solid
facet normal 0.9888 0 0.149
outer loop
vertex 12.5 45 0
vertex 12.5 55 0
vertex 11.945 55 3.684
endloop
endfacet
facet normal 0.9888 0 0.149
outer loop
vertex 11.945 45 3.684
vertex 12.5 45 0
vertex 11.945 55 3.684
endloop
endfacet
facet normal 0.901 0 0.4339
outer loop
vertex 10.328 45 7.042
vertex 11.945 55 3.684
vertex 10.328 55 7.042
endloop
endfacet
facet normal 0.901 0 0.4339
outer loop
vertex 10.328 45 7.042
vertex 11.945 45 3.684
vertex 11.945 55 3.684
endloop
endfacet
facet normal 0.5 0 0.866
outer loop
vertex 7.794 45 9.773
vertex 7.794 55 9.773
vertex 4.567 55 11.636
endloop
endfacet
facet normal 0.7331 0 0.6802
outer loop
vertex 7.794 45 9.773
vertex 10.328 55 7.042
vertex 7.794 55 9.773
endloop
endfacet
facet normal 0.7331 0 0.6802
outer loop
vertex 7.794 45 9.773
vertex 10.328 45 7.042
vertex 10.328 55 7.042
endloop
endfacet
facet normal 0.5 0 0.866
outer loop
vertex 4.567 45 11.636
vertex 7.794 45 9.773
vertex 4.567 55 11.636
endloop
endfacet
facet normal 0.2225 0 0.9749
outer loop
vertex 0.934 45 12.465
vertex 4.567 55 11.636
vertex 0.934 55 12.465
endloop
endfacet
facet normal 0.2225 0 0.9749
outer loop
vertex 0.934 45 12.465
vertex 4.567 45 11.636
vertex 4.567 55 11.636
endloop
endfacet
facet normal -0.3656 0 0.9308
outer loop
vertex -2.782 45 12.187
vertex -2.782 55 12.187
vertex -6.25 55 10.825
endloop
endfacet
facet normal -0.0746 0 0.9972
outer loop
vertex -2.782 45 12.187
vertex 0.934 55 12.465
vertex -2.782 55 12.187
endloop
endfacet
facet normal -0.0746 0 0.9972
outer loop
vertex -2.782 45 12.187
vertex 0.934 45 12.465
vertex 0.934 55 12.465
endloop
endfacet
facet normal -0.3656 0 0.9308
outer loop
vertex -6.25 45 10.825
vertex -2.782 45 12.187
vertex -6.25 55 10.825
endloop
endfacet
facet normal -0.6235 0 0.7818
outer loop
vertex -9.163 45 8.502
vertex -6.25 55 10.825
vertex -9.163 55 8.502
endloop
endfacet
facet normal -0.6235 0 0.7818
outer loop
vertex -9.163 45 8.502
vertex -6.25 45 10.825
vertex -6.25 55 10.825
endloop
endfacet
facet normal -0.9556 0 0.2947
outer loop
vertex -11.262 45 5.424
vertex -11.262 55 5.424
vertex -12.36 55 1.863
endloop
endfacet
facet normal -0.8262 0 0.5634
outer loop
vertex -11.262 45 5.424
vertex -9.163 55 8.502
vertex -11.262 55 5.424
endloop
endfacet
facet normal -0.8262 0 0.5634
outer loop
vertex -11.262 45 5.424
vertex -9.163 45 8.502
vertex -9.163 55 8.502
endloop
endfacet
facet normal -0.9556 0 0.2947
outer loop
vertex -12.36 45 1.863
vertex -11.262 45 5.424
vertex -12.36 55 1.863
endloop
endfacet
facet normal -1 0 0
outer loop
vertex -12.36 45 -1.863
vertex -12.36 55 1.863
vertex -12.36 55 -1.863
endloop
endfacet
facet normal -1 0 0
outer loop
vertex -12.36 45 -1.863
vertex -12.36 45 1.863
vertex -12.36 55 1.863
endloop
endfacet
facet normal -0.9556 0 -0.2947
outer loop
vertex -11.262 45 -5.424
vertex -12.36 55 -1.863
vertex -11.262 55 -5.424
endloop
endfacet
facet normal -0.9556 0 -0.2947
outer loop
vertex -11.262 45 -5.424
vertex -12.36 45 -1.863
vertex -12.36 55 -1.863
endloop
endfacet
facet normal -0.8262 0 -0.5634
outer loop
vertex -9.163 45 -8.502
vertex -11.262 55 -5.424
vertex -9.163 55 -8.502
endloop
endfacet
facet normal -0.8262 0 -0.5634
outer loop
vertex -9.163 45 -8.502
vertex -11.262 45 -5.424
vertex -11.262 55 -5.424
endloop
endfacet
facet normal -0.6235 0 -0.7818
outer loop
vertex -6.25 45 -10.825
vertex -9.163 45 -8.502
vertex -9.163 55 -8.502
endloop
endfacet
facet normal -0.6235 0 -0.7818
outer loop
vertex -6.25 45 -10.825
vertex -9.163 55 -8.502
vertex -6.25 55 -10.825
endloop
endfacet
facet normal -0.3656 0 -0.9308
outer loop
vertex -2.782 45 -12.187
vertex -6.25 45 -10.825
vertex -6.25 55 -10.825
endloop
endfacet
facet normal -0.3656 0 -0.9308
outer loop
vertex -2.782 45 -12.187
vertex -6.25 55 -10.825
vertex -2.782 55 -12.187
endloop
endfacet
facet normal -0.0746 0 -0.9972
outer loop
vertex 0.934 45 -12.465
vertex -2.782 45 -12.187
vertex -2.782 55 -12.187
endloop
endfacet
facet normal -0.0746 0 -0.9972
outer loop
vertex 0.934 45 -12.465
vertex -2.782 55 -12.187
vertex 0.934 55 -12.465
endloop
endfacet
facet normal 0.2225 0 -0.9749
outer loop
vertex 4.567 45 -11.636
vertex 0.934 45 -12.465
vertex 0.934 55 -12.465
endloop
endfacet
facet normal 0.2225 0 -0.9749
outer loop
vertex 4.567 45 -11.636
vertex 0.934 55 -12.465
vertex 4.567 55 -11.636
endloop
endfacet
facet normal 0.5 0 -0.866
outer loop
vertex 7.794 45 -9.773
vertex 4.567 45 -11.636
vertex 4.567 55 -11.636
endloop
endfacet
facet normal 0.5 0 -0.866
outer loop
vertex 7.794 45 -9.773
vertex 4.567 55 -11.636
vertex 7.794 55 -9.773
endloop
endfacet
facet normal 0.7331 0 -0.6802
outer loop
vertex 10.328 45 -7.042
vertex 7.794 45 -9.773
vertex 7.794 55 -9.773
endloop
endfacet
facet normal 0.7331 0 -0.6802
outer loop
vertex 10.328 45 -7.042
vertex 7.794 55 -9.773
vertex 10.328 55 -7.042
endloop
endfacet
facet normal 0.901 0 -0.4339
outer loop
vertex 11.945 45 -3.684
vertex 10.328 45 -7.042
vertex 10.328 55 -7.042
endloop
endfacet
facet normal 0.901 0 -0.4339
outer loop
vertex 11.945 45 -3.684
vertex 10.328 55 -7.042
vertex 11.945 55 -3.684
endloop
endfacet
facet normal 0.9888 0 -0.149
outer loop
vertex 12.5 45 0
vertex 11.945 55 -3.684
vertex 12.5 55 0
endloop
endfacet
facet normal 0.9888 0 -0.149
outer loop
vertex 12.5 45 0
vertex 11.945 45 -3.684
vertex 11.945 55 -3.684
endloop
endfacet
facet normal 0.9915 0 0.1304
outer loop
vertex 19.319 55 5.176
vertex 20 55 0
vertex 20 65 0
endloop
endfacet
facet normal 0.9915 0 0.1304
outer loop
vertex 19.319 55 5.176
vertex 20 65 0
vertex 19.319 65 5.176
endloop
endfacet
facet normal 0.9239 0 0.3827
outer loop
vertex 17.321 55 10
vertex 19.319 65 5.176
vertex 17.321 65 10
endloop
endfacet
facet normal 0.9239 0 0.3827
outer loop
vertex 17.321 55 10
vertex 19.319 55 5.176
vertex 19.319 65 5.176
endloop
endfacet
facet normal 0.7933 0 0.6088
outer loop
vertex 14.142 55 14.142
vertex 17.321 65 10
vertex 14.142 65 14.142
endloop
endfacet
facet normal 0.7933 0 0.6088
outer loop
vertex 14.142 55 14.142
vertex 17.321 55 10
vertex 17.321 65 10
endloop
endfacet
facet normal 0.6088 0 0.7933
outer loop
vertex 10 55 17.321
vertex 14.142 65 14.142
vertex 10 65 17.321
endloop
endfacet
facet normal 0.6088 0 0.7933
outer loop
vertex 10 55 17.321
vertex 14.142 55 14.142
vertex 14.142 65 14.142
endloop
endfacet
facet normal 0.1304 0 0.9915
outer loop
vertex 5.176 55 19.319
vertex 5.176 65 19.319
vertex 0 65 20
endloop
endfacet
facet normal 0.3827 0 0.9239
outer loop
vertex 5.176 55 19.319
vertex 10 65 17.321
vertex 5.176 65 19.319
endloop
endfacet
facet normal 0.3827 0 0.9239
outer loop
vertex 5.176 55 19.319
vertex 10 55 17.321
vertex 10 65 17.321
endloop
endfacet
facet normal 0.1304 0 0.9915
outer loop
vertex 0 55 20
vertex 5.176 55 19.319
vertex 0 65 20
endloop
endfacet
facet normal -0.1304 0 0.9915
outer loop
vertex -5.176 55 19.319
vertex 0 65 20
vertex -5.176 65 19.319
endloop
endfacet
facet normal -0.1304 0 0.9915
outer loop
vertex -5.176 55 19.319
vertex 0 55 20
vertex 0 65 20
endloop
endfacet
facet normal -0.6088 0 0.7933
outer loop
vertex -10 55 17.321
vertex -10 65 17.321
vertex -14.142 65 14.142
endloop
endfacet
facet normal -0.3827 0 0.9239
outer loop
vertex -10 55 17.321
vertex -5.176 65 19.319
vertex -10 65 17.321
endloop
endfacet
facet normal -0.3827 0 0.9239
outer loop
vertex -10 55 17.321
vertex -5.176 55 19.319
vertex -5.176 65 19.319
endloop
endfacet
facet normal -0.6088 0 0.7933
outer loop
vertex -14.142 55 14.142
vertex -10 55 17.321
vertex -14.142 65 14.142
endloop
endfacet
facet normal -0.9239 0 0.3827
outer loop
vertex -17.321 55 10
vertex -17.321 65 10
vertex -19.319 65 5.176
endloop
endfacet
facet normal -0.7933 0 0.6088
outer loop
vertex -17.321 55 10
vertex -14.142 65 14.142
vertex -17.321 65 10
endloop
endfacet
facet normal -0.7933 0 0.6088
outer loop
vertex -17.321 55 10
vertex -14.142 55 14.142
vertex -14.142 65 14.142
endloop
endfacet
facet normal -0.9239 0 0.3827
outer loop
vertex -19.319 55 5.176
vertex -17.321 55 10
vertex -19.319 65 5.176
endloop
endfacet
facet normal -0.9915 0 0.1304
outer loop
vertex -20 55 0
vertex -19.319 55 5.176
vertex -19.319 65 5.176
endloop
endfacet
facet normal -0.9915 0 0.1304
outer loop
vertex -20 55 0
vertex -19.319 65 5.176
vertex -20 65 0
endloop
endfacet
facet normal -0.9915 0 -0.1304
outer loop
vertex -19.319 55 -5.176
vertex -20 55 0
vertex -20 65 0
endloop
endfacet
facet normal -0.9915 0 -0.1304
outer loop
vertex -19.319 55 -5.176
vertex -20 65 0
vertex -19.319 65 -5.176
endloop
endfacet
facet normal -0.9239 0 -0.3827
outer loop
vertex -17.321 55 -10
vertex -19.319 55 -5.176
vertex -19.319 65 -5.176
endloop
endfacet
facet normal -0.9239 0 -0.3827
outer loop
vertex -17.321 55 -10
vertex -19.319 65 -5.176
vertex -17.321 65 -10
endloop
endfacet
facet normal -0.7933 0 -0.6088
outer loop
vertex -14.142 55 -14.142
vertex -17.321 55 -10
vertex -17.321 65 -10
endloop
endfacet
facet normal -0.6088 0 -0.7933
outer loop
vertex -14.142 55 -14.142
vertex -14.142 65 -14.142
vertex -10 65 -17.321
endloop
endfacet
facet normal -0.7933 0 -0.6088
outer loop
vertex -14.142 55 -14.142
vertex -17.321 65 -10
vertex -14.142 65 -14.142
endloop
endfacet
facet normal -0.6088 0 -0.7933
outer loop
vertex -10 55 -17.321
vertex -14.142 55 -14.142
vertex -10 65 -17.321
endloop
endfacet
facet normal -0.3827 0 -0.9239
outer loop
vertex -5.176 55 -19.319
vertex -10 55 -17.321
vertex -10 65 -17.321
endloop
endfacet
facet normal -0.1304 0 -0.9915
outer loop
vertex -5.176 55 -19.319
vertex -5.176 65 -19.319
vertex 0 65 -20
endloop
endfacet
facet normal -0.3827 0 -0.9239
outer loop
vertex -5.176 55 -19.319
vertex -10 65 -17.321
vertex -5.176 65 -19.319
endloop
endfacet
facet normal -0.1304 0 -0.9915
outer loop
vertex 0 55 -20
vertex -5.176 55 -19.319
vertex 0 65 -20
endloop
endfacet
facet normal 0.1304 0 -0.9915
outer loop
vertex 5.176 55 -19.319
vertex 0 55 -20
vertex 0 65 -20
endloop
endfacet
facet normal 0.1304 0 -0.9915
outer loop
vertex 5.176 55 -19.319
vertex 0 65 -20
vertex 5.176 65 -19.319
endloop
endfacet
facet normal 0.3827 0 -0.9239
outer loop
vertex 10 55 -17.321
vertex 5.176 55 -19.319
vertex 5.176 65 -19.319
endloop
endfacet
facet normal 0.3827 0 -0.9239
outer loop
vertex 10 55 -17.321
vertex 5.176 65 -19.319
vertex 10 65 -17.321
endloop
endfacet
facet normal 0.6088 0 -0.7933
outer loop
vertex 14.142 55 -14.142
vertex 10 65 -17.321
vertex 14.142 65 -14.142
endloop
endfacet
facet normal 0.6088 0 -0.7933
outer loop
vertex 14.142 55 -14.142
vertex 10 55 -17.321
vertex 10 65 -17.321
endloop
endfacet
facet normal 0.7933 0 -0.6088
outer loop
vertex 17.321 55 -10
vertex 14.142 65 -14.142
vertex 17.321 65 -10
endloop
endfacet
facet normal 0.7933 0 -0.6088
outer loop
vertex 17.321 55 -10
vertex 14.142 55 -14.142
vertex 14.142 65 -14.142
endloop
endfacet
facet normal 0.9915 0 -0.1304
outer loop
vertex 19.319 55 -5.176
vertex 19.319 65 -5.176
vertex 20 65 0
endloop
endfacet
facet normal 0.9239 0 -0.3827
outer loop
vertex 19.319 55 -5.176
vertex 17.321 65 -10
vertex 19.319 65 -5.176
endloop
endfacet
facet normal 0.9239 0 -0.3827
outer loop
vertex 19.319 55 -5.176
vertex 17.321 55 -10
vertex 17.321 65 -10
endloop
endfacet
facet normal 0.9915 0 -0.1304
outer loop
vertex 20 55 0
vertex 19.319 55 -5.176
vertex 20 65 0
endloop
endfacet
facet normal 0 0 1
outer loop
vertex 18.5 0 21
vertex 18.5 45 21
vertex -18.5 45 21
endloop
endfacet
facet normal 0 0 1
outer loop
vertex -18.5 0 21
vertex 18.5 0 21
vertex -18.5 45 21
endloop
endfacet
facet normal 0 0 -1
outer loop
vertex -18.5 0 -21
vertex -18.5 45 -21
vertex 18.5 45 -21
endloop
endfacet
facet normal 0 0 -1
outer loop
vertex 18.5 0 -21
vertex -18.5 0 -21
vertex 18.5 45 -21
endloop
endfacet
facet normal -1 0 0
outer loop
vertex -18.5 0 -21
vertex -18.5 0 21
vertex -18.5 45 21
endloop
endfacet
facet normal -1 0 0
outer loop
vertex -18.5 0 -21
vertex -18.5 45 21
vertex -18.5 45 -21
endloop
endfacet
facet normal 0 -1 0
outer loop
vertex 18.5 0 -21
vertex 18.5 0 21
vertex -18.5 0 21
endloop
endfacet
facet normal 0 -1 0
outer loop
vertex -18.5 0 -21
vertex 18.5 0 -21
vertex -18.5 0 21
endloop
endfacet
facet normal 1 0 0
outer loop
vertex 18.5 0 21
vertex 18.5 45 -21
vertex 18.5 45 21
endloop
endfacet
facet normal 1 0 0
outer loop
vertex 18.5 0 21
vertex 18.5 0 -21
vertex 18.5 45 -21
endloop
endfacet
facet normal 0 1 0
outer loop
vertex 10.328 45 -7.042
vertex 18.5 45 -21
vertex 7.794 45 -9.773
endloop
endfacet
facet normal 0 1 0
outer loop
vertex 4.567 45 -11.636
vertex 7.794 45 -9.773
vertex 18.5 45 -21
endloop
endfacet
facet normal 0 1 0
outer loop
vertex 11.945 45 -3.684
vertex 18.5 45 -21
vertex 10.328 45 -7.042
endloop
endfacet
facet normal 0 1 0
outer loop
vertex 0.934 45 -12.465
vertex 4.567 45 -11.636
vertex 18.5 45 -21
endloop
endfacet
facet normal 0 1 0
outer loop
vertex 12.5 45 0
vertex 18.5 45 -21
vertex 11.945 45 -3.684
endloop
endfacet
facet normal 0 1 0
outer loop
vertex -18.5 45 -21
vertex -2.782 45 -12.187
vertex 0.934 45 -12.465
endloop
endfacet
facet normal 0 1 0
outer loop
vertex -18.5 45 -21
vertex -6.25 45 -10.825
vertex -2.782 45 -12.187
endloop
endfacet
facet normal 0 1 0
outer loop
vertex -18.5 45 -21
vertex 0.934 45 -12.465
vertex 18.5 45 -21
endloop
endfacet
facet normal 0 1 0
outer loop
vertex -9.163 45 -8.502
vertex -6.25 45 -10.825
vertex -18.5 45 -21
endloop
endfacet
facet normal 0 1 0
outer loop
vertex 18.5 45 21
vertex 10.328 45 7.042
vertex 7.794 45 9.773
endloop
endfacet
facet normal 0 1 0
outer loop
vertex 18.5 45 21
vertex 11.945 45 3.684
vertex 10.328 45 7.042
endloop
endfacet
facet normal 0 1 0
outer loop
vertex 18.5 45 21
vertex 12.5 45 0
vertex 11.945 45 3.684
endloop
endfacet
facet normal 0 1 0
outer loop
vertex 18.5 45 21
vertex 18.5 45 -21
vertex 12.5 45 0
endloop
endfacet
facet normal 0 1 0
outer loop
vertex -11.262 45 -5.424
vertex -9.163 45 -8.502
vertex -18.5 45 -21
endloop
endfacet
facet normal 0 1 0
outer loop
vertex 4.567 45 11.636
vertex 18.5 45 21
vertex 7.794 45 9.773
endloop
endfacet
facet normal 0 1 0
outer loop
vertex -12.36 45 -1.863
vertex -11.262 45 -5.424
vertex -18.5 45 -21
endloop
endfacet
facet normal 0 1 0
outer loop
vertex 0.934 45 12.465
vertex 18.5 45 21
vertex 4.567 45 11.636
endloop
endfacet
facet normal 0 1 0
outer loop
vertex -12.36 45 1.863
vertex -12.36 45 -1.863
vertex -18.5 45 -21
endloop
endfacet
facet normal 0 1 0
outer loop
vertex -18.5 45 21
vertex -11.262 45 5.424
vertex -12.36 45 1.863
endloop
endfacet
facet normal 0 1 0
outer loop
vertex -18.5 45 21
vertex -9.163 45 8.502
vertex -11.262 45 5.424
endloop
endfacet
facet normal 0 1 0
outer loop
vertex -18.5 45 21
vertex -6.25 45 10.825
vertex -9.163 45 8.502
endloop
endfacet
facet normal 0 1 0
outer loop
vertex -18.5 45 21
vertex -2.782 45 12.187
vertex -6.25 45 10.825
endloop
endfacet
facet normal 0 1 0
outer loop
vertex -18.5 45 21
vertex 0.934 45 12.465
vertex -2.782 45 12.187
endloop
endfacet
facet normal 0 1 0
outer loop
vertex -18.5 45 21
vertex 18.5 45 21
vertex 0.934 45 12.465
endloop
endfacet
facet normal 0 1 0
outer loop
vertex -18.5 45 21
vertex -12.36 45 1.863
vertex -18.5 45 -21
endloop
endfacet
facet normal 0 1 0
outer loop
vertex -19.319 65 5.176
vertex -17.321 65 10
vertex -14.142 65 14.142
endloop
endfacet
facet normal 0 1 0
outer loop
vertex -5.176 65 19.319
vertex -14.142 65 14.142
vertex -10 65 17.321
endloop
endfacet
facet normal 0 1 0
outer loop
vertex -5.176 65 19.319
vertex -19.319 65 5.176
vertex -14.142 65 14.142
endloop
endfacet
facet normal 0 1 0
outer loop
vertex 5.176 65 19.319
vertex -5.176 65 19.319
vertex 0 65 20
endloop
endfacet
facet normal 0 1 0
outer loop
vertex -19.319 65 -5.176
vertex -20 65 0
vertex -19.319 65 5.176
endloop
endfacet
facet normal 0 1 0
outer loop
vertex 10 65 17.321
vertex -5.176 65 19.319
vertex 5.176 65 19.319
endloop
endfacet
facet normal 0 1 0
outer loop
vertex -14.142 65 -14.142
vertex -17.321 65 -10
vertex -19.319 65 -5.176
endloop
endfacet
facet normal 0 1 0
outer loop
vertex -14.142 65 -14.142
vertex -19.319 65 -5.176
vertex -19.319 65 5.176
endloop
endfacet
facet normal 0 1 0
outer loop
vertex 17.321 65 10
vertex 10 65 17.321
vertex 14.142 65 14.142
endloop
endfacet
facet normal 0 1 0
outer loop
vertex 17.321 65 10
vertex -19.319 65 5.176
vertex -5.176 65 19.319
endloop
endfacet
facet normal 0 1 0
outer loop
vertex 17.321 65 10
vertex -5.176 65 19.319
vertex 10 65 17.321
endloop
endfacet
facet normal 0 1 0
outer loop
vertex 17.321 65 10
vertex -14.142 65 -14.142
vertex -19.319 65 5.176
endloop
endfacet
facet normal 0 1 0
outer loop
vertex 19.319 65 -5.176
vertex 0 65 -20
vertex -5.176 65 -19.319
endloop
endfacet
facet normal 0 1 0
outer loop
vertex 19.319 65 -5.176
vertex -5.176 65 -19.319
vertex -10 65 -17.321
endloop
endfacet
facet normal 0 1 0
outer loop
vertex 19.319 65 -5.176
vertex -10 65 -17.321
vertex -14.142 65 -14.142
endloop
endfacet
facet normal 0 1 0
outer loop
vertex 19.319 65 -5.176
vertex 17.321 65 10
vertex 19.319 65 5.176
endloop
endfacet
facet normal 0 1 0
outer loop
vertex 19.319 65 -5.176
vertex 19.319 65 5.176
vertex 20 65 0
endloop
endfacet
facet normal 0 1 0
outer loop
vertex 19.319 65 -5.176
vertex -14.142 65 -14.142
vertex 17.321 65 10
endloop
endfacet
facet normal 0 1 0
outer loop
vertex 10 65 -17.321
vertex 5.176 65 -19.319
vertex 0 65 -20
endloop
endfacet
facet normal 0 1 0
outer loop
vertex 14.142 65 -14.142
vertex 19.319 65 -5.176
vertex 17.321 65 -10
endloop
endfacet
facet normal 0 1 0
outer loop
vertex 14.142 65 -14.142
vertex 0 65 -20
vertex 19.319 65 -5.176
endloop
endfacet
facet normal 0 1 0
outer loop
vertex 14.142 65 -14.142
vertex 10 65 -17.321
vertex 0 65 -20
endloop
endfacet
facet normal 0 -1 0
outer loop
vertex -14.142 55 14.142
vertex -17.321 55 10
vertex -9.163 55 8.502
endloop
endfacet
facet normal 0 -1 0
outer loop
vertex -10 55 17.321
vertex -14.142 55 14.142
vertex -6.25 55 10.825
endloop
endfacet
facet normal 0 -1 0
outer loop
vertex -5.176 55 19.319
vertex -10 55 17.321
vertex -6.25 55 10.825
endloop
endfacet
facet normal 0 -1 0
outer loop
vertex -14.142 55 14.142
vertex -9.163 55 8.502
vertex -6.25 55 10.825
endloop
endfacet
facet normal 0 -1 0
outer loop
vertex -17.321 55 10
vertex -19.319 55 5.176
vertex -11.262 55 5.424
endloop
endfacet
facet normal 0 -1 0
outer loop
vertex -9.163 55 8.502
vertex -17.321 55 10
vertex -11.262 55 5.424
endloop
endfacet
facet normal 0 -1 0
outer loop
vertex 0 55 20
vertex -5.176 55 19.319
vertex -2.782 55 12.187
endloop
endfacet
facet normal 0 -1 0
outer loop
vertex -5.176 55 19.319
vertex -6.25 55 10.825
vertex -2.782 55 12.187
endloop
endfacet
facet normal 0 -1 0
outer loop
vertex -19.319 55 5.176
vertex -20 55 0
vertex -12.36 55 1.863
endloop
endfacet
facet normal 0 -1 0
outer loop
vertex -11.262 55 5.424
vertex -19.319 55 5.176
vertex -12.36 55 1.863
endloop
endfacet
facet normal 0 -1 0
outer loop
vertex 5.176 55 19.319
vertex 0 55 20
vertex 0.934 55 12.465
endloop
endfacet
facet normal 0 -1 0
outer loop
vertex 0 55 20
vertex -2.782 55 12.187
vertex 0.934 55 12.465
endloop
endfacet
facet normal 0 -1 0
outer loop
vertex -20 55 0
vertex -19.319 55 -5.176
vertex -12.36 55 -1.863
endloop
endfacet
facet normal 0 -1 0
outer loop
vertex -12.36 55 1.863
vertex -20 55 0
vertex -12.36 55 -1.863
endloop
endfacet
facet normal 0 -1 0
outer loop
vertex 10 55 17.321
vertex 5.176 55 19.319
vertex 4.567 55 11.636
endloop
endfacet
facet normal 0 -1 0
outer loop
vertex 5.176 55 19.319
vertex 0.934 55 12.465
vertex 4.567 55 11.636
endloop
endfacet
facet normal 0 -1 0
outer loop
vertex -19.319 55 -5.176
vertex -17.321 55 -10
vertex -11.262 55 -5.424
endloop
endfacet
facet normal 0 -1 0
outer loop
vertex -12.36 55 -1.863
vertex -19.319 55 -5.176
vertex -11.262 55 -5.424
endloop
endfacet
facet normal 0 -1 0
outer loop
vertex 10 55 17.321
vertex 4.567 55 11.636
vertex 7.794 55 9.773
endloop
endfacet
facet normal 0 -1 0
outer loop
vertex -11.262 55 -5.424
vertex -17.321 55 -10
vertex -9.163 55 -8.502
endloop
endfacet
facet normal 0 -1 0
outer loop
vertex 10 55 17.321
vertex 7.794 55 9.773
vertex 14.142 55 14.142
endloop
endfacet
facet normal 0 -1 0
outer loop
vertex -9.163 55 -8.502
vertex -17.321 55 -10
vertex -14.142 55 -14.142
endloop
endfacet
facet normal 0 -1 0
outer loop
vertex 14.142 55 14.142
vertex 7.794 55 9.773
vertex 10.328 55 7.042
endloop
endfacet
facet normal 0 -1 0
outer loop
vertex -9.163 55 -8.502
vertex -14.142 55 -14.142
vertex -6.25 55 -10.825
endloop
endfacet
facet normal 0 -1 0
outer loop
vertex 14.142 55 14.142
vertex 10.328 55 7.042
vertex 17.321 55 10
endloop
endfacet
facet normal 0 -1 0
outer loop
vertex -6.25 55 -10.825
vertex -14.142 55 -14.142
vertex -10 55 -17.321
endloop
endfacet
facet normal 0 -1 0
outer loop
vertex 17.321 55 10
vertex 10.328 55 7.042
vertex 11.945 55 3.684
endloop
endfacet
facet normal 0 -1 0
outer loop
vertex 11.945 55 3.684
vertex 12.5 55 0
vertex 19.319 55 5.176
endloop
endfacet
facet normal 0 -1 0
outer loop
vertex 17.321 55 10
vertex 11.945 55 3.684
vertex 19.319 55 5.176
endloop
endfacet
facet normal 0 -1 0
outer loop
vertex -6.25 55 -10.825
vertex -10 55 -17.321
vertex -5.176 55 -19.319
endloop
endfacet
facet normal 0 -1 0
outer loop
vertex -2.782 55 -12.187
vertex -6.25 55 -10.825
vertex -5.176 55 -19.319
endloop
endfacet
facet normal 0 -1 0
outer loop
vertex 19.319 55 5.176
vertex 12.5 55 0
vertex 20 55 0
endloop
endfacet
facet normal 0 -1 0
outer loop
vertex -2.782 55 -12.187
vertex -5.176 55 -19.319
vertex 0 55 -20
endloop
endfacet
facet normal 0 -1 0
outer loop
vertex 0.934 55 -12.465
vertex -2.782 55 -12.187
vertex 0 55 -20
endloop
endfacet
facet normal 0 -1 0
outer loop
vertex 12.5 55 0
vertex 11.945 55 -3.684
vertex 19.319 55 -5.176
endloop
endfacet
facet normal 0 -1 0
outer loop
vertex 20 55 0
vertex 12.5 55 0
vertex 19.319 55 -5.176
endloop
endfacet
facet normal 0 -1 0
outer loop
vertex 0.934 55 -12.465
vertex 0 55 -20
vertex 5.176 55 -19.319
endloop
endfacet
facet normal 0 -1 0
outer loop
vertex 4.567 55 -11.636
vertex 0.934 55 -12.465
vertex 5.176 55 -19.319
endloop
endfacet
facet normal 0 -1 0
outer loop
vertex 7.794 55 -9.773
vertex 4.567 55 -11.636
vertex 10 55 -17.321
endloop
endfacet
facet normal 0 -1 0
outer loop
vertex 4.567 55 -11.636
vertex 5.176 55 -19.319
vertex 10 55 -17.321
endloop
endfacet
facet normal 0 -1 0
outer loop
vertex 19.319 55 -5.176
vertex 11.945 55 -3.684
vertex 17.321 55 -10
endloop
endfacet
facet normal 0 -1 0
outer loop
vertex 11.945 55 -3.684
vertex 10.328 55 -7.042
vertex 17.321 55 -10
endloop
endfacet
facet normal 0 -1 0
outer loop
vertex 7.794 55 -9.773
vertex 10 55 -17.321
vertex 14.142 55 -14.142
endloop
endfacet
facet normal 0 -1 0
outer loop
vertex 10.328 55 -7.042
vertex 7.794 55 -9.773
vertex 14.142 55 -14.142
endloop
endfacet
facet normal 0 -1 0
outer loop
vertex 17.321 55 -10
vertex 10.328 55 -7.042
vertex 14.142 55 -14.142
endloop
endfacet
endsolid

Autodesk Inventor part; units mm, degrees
ref_plane "YZ Plane" through (0, 0, 0) normal (1, 0, 0) x (0, 1, 0)
ref_plane "XZ Plane" through (0, 0, 0) normal (0, 1, 0) x (-1, 0, 0)
ref_plane "XY Plane" through (0, 0, 0) normal (0, 0, 1) x (1, 0, 0)
sketch "Sketch1" plane through (0, 0, 0) normal (0, 1, 0) x (-1, 0, 0)
  line L0 (-18.5, 21) -> (18.5, 21)
  line L1 (18.5, 21) -> (18.5, -21)
  line L2 (18.5, -21) -> (-18.5, -21)
  line L3 (-18.5, -21) -> (-18.5, 21)
  line L4 (-18.5, 21) -> (18.5, -21) construction
  line L5 (18.5, 21) -> (-18.5, -21) construction
  point P0 (0, 0)
  dimension "d0" = 37
  dimension "d1" = 42
extrude "Extrusion1" add sketch "Sketch1" along normal blind 45
sketch "Sketch2" plane through (0, 45, 0) normal (0, 1, 0) x (1, 0, 0)
  circle A0 centre (0, 0) radius 12.5
  dimension "d4" = 25
extrude "Extrusion2" add sketch "Sketch2" along normal blind 10
sketch "Sketch3" plane through (0, 55, 0) normal (0, 1, 0) x (1, 0, 0)
  circle A0 centre (0, 0) radius 20
  dimension "d7" = 40
extrude "Extrusion3" add sketch "Sketch3" along normal blind 10
properties part number "emergency_stop"
